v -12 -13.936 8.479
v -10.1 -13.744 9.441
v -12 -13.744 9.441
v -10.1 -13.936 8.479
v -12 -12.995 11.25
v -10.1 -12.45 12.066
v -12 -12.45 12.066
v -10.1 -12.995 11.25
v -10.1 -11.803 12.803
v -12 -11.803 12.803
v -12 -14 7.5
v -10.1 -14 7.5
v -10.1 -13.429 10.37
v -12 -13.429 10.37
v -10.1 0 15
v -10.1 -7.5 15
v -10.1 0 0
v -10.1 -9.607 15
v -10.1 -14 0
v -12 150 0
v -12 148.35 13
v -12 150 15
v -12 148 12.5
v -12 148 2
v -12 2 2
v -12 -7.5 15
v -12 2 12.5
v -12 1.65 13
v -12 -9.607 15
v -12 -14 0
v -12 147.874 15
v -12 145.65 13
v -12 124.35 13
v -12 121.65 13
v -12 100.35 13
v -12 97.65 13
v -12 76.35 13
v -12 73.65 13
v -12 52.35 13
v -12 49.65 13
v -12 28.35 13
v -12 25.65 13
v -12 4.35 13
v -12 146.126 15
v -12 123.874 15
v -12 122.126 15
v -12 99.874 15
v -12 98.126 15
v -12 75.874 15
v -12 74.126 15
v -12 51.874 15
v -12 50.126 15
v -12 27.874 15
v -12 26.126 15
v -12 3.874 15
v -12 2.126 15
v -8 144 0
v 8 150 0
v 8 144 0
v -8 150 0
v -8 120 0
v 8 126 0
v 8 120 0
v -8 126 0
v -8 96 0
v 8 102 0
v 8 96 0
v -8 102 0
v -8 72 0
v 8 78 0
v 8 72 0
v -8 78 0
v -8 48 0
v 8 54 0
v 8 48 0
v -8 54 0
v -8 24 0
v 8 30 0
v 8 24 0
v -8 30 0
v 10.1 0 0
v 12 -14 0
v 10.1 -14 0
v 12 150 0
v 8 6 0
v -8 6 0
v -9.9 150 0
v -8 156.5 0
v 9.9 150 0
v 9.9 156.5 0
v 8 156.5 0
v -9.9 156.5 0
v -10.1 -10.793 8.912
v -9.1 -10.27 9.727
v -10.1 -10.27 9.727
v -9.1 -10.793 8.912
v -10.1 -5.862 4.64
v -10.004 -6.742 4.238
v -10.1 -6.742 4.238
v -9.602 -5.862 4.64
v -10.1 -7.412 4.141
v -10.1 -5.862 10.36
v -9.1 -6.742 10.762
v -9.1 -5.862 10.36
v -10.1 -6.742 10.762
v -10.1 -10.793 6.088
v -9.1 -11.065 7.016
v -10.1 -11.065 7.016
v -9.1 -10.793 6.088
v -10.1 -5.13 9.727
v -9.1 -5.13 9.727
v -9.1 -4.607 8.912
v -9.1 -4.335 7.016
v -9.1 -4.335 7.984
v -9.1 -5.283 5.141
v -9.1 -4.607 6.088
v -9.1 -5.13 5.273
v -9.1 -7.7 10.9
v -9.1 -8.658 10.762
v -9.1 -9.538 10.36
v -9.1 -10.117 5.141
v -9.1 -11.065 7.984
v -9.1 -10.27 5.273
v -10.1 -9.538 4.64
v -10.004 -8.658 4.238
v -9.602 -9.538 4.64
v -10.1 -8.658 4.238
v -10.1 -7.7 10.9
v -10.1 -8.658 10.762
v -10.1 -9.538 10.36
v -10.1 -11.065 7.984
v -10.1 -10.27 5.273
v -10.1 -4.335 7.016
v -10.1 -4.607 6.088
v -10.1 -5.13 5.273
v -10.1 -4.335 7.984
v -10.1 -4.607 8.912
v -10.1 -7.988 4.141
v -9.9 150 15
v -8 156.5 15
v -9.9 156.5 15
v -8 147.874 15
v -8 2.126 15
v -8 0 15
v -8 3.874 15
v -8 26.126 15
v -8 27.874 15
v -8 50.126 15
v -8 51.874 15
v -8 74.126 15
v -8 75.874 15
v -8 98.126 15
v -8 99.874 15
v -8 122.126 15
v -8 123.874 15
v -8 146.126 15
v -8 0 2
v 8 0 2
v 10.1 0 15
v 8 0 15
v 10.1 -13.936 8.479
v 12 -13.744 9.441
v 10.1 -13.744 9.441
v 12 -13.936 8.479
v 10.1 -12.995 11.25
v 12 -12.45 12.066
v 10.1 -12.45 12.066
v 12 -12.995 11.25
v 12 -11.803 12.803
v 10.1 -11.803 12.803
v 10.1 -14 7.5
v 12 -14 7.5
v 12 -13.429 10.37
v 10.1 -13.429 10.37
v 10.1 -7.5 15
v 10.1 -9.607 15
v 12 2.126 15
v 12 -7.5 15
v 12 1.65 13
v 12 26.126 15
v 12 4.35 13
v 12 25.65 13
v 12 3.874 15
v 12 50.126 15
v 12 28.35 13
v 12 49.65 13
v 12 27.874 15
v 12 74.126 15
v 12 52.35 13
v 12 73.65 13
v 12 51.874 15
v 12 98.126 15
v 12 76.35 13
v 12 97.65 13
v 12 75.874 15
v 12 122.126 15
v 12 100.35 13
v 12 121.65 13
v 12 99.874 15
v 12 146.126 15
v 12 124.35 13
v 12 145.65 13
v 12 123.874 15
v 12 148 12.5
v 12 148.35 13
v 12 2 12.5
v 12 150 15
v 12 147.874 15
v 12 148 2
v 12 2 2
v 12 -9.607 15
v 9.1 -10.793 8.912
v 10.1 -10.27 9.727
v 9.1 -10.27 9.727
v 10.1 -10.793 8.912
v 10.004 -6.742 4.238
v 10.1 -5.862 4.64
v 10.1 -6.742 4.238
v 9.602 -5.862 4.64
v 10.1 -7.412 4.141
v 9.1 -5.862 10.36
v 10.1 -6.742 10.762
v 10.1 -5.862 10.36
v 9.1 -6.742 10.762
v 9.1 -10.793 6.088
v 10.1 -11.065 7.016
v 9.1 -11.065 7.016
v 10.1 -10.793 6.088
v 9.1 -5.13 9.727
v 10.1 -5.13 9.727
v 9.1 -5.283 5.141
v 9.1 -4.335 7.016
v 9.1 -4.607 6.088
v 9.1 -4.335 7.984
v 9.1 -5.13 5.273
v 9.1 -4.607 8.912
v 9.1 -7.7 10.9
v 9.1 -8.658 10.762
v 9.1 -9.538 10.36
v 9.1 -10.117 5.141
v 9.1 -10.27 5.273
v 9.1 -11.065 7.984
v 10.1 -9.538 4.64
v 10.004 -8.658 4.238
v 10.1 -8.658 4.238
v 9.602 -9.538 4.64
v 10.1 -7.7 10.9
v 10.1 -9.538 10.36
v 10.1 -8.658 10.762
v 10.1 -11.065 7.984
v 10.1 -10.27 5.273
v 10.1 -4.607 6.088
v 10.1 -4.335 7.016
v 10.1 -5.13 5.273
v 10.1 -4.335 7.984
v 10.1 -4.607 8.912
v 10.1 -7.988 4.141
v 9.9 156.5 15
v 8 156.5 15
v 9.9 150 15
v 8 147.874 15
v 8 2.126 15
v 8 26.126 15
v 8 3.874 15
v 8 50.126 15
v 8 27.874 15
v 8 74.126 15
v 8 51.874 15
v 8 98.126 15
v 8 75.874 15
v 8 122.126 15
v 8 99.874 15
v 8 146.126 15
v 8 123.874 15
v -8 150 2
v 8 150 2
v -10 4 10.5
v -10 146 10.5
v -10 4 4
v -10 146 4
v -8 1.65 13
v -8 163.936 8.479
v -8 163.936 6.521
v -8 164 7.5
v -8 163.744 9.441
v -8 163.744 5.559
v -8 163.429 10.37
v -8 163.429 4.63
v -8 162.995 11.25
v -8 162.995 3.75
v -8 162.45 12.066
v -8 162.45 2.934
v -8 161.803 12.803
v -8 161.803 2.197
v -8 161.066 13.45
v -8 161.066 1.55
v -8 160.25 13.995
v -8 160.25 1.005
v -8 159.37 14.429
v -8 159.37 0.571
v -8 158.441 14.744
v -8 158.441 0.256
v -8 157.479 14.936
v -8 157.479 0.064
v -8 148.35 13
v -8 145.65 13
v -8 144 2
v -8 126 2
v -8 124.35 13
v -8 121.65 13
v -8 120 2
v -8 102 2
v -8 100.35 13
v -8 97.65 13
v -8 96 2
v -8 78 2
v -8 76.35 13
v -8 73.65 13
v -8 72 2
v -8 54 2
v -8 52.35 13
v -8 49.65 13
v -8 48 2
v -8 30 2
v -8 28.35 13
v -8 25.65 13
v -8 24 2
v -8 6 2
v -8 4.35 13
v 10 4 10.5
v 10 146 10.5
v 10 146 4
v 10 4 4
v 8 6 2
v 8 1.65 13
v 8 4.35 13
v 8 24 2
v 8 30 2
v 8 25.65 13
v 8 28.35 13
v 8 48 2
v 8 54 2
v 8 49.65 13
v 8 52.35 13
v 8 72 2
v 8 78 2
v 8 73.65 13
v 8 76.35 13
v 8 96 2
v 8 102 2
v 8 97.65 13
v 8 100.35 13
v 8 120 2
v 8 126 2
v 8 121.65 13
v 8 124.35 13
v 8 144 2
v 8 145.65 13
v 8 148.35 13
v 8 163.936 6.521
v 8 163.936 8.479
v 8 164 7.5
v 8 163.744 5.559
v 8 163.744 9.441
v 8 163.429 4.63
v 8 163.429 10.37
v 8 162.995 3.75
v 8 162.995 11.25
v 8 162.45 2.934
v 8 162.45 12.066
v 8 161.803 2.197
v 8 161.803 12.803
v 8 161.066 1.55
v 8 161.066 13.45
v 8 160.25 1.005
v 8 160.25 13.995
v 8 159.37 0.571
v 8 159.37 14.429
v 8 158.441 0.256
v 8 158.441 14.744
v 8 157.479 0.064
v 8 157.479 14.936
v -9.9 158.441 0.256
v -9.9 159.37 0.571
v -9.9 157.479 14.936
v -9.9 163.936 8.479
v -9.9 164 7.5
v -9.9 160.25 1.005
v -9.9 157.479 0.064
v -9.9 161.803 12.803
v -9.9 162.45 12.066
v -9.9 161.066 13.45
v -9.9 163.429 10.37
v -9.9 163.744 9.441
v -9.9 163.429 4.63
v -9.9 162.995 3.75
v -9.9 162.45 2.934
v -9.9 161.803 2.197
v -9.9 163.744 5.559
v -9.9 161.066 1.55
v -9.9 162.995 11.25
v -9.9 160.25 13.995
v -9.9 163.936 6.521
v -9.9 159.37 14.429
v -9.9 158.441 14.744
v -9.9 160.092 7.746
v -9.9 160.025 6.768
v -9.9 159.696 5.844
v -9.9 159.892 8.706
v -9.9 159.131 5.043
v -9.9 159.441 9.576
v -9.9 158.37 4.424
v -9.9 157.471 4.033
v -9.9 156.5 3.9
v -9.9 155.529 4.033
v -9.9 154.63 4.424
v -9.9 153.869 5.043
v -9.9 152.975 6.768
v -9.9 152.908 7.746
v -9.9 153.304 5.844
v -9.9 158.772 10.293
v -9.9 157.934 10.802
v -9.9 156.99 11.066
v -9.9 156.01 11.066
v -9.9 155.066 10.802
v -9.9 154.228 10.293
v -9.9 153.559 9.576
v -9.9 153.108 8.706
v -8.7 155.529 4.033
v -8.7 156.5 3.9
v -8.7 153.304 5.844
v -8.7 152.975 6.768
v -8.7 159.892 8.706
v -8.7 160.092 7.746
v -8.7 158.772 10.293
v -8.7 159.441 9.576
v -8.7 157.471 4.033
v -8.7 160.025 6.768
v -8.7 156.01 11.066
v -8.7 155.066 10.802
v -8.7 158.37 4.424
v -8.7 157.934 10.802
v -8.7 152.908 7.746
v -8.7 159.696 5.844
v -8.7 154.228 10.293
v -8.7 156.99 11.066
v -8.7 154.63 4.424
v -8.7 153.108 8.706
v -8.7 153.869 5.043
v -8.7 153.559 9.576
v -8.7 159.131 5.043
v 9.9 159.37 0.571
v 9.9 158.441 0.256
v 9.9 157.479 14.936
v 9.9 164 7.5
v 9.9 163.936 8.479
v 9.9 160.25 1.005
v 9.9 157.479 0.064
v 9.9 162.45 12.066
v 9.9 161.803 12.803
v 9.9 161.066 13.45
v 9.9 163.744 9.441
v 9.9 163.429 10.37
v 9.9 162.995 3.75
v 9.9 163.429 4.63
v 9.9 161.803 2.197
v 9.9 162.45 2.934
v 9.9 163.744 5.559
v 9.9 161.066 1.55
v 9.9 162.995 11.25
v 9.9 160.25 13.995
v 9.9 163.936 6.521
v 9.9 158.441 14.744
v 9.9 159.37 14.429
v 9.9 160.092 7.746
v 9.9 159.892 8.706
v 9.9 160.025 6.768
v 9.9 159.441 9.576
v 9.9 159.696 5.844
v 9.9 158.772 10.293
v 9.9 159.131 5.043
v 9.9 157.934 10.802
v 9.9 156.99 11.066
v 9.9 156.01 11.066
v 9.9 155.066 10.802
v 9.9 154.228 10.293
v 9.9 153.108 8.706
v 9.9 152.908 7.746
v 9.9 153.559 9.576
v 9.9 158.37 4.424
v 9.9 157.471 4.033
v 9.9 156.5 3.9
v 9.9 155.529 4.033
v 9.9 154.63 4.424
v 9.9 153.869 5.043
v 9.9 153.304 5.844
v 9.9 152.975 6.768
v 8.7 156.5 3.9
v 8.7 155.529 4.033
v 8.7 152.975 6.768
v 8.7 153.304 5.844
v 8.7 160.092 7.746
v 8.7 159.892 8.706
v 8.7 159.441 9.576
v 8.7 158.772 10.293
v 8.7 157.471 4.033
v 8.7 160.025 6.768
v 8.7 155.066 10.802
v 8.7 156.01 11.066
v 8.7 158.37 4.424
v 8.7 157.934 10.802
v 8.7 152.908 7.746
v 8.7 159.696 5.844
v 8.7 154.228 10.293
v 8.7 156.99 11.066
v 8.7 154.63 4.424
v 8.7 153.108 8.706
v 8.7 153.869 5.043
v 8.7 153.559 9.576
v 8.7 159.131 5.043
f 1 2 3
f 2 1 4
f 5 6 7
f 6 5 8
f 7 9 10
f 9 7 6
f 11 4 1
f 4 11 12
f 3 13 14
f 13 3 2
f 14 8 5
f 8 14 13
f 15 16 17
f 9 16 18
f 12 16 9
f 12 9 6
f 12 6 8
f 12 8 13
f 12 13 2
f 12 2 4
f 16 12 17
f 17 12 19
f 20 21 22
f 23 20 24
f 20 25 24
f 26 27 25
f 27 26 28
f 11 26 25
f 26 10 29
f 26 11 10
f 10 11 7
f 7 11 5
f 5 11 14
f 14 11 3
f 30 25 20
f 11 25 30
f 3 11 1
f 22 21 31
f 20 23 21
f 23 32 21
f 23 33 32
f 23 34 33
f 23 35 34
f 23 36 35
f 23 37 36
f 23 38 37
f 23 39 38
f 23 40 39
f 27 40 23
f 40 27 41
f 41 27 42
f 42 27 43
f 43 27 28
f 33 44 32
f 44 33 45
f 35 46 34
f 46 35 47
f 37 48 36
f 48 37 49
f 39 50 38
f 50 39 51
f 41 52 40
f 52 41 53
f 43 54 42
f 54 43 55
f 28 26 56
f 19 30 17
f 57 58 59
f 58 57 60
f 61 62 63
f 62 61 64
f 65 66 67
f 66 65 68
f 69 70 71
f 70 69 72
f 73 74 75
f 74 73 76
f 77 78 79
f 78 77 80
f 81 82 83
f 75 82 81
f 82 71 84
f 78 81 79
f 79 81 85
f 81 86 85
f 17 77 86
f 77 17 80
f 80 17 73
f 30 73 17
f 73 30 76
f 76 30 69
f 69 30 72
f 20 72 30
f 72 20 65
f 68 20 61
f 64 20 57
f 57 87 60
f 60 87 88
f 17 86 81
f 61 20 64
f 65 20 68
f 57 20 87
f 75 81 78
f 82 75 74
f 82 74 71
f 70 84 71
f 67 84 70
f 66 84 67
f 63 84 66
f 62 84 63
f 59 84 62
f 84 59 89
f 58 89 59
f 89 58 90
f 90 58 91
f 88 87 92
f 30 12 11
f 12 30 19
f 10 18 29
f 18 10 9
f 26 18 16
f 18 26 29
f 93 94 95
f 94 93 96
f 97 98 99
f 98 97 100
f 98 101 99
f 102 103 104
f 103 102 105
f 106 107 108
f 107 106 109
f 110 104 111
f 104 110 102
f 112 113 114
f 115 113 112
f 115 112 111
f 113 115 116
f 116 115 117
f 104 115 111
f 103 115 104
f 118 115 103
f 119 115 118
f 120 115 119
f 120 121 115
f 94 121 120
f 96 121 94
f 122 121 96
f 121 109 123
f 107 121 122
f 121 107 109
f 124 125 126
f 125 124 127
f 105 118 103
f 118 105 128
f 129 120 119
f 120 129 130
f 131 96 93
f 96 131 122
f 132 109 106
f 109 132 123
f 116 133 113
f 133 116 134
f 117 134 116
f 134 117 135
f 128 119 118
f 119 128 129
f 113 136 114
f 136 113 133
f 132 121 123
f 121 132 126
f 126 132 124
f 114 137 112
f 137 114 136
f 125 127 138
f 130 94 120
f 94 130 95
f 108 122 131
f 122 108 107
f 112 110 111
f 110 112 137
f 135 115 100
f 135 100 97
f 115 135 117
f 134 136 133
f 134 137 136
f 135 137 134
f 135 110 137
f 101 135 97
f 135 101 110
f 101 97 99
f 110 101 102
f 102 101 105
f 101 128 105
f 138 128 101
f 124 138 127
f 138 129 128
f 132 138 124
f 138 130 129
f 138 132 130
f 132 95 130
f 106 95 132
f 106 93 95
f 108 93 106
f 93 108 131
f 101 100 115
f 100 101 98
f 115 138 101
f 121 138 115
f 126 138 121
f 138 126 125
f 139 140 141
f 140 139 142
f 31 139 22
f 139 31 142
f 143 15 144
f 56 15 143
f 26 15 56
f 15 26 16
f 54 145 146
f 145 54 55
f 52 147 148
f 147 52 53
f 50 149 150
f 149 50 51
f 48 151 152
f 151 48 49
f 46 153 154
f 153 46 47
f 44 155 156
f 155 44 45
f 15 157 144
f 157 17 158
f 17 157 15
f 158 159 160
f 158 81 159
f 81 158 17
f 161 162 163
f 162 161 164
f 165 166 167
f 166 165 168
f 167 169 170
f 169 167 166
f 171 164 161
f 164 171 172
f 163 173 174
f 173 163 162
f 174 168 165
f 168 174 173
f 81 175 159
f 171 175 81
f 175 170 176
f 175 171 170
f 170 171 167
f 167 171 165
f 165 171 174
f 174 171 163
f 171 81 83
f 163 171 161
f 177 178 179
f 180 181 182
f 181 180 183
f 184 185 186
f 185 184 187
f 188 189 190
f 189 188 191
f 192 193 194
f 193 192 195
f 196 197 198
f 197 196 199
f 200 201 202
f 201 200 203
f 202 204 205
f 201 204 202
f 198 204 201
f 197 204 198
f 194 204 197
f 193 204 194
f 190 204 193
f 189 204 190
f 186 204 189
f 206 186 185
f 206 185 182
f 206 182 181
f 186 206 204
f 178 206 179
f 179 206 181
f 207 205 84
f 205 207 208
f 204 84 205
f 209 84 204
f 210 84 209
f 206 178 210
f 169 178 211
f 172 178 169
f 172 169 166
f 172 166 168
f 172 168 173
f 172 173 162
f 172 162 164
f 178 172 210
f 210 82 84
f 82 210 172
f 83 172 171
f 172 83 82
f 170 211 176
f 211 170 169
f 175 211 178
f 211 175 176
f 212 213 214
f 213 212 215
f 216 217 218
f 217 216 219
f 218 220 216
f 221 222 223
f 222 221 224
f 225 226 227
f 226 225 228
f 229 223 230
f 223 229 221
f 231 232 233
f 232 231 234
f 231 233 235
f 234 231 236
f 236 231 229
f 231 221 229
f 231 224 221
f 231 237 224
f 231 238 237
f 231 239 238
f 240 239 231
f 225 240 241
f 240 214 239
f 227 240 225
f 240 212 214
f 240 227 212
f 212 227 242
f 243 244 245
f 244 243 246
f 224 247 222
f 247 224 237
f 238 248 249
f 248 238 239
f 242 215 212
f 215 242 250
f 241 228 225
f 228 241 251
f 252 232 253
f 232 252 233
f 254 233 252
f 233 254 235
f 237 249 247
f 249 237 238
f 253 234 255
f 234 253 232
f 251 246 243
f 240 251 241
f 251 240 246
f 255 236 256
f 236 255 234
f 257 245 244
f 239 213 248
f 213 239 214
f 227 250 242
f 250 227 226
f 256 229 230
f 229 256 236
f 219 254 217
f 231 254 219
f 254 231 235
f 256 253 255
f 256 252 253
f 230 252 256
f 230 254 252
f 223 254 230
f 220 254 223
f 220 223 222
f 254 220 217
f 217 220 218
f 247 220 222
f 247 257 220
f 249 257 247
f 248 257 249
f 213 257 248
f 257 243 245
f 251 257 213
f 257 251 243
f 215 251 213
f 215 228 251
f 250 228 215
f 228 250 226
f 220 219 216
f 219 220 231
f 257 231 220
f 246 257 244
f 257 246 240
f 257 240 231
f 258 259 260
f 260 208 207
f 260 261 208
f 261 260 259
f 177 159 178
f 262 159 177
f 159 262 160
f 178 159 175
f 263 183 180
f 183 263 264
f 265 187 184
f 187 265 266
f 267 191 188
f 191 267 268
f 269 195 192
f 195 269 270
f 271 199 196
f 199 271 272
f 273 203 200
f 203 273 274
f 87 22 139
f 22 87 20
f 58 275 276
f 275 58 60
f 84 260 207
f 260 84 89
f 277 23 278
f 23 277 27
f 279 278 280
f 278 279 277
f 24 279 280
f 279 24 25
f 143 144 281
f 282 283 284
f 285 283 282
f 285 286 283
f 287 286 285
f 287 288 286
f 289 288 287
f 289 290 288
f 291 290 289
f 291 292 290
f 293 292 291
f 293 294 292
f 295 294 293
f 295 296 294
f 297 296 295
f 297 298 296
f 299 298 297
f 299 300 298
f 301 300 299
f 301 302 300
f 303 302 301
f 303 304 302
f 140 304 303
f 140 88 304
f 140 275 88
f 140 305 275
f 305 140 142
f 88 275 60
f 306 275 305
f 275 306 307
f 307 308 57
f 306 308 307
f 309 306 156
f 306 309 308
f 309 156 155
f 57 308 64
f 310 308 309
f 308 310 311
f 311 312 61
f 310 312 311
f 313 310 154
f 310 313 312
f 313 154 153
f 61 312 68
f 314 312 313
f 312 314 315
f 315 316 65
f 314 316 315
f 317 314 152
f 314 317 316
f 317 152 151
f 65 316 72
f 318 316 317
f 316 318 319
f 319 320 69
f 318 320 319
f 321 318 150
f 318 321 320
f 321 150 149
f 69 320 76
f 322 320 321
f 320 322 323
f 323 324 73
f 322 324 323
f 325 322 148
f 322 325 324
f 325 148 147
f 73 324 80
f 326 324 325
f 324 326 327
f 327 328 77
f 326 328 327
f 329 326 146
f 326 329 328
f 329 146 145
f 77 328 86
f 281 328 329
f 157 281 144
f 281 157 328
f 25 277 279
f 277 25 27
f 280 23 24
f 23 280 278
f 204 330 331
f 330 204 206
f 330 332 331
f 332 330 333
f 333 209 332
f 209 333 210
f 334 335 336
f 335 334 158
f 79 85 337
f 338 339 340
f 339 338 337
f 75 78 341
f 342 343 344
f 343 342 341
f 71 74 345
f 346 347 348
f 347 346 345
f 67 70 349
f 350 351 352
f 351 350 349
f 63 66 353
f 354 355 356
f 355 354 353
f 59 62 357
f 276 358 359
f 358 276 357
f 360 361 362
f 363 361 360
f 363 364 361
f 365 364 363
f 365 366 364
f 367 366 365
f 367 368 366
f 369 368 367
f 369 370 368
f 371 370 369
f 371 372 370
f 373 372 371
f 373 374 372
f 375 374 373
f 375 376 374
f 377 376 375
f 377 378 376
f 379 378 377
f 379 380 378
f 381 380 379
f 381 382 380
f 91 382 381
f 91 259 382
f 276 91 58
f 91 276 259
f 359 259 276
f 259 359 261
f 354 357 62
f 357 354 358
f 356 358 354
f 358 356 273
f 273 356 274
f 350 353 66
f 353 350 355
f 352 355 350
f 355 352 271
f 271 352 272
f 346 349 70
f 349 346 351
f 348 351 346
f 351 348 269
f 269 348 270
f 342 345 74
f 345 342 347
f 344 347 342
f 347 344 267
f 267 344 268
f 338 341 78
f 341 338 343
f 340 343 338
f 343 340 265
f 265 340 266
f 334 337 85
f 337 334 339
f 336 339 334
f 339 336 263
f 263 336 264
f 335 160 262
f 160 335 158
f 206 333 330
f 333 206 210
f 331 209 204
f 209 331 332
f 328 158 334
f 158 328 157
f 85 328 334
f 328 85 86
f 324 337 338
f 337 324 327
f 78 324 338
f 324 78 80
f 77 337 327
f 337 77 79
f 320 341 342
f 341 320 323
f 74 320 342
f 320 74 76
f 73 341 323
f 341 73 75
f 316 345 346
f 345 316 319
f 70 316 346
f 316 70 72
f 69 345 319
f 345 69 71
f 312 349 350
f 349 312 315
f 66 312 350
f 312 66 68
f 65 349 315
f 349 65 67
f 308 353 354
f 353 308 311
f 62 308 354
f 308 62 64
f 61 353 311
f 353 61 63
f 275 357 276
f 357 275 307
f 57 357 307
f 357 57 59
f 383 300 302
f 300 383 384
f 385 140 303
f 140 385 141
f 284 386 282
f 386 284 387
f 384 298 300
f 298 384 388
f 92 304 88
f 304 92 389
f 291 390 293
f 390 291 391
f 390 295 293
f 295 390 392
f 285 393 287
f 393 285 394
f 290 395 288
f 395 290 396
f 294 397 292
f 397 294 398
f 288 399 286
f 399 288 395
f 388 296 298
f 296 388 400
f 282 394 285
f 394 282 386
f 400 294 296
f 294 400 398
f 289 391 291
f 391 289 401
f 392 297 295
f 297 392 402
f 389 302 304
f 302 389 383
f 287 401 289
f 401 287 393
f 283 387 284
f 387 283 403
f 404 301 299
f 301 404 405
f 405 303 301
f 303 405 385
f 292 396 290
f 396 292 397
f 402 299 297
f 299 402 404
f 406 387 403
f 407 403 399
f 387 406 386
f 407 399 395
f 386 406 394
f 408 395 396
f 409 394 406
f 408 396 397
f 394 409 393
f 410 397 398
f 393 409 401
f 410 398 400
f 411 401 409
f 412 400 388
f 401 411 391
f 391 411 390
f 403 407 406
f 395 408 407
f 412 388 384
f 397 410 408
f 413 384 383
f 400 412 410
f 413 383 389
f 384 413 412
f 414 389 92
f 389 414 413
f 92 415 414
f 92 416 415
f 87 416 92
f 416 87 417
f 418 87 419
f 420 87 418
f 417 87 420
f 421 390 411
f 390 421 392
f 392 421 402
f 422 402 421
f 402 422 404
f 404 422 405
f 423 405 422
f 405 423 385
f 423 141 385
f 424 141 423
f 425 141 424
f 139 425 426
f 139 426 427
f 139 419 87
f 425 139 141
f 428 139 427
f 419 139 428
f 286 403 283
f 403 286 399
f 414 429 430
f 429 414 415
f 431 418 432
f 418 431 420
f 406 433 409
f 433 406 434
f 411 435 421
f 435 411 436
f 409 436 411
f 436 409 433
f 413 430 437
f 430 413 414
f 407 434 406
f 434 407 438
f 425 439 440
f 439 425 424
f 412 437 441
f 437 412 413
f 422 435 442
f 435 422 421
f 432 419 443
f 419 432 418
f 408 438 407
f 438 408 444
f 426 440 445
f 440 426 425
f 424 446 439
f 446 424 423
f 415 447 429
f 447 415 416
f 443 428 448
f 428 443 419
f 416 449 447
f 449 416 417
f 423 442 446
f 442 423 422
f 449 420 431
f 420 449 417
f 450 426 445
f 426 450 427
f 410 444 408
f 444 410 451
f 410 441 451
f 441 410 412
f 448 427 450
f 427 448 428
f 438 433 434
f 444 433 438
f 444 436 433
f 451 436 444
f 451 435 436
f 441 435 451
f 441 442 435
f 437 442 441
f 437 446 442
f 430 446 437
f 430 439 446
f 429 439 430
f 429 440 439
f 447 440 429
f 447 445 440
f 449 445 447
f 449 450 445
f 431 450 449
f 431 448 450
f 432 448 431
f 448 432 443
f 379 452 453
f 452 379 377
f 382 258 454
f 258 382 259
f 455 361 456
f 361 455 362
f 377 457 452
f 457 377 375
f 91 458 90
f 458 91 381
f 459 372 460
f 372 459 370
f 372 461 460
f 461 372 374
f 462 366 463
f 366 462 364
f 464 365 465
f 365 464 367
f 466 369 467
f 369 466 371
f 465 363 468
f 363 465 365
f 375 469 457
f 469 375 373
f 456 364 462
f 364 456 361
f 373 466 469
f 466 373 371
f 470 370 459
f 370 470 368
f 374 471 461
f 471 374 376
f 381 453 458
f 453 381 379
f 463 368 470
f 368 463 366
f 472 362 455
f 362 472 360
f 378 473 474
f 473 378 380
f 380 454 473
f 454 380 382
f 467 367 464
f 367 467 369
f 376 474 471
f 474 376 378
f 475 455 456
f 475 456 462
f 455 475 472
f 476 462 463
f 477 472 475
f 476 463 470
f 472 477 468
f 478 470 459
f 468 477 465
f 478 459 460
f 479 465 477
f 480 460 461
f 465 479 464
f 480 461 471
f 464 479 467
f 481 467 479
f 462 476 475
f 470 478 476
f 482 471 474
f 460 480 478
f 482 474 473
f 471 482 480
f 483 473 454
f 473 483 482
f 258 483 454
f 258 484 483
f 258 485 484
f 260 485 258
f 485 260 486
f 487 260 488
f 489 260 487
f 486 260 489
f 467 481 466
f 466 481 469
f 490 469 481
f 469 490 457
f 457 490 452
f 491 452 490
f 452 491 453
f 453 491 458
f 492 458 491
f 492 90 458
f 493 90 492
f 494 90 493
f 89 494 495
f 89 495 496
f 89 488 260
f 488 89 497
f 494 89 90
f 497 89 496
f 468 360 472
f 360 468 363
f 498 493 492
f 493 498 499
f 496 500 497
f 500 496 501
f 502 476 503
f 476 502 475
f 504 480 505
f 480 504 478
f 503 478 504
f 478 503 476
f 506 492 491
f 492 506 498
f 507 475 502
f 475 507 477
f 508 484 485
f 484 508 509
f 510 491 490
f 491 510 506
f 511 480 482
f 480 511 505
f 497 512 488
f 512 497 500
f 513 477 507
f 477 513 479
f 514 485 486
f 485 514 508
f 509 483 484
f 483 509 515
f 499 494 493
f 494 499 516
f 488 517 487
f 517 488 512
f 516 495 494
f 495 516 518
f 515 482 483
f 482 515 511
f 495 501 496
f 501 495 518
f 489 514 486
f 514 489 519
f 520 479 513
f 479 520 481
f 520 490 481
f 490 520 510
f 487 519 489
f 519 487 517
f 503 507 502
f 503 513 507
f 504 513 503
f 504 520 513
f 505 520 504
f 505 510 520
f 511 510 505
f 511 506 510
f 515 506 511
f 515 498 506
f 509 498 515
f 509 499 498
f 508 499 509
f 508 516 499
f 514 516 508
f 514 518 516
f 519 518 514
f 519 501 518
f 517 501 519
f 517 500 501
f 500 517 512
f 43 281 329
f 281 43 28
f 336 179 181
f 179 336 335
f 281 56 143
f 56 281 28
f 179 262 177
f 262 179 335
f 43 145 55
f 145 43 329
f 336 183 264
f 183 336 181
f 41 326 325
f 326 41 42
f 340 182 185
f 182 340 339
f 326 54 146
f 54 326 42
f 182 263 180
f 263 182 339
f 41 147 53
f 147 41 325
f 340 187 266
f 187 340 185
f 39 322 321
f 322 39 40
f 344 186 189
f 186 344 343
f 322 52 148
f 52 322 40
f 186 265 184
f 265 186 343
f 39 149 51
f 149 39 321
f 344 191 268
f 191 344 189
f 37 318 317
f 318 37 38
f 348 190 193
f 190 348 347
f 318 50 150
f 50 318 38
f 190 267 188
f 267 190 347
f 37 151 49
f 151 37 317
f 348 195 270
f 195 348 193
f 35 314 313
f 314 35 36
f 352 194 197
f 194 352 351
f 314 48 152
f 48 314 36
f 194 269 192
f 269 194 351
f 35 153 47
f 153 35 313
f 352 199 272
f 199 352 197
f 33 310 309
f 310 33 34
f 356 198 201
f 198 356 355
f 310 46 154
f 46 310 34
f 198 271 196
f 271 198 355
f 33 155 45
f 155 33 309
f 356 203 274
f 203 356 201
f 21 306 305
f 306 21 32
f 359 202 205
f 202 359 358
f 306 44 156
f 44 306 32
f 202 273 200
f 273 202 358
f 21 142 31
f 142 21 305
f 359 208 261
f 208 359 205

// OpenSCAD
// file: link.scad
include<parameters.scad>;

module notch_profile(with_tolerance=false) {
    polygon([
        [clip_thickness,
         -1.25 - (with_tolerance ? tolerance/2 : 0)],
        [(with_tolerance ? -.1 : 0),
         -.75 - (with_tolerance ? tolerance/2 : 0)],
        [(with_tolerance ? -.1 : 0),
         .75 + (with_tolerance ? tolerance/2 : 0)],
        [clip_thickness,
         1.25 + (with_tolerance ? tolerance/2 : 0)]
    ]);
}

module link_back() {
    union()
    translate([0, 0, outer_height/2])
    for(n=[0, 1])
    mirror([n, 0, 0])
    translate([-outer_width/2, 0, 0])
    union() {
        translate([0, _trim, 0])
        union() {
            difference() {
                translate([0, -outer_height/2, 0])
                rotate([0, 90, 0])
                cylinder(d=outer_height, h=wall_thickness-tolerance/2);

                translate([-.1, -outer_height/2, -outer_height/2])
                cube([wall_thickness+.2, outer_height/2, outer_height]);
            }

            translate([0, -outer_height, -outer_height/2])
            cube([wall_thickness-tolerance/2, outer_height/2, outer_height/2]);

            radius = (outer_height/2);
            translate([0, -(radius*(1+cos(45))), radius*sin(45)])
            rotate([90, 0, 90])
            linear_extrude(height=wall_thickness-tolerance/2)
            polygon([
                [0, 0],
                [radius*(1-sin(45)), radius*(1-sin(45))],
                [radius*cos(45), radius*(1-sin(45))],
                [radius*cos(45), 0]
            ]);
        }

        translate([0, -outer_height/2, -outer_height/2])
        cube([wall_thickness-tolerance/2, outer_height/2, outer_height]);

        // key
        translate([0, -outer_height/2-tolerance, 0])
        rotate([0, 90, 0])
        translate([0, 0, wall_thickness-.1])
        difference() {
            cylinder(d=key_diameter-tolerance, h=key_depth+.1-tolerance);

            translate([key_diameter/2, -key_diameter/2-1, 0])
            rotate([0, 270-key_slope_bottom, 0])
            translate([0, 0,-.9])
            cube([10,10,1]);
        }
    }
}

module link_mid() {
    translate([0, -mid_depth, 0])
    difference() {
        union() {
            // walls
            translate([0, 0, outer_height/2])
            for(n=[0, 1])
            mirror([n, 0, 0])
            translate([-outer_width/2, 0, -outer_height/2])
            cube([wall_thickness * 2, mid_depth, outer_height]);

            // base
            translate([-outer_width/2, 0, 0])
            cube([outer_width, mid_depth, wall_thickness]);
        }

        // notch cutout
        translate([-outer_width/2-.5, mid_depth/2, outer_height])
        rotate([0, 90, 0])
        linear_extrude(height=outer_width+1)
        notch_profile(true);
    }
}

module link_front() {
    union()
    translate([0, 0, outer_height/2])
    for(n=[0, 1])
    mirror([n, 0, 0])
    translate([-outer_width/2 + wall_thickness, 0, 0])
    difference() {
        union() {
            translate([0, -_trim, 0])
            difference() {
                translate([tolerance/2, outer_height/2, 0])
                rotate([0, 90, 0])
                cylinder(d=outer_height, h=wall_thickness-tolerance/2);

                translate([tolerance-.1, 0, -outer_height/2])
                cube([wall_thickness-tolerance+.2, outer_height/2, outer_height]);
            }

            translate([tolerance/2, 0, -outer_height/2])
            cube([wall_thickness-tolerance/2, outer_height/2-_trim, outer_height]);
        }

        // keyhole
        translate([0, outer_height/2-_trim, 0])
        rotate([0, 90, 0])
        translate([0, 0, -.1])
        cylinder(d=key_diameter+tolerance, h=key_depth+.1+tolerance);
    }
}

module clip() {
    union() {
        for(r=[0, 180])
        rotate([0, 0, r]) {
            translate([outer_width/2-wall_thickness*2.5, 0, clip_thickness])
            rotate([0, 90, 0])
            linear_extrude(height=wall_thickness+.25)
            notch_profile(false);

            translate([outer_width/2-wall_thickness*2-clip_curve_thickness, -1.5, 0])
            cube([clip_curve_thickness, 3, clip_thickness]);

            translate([-clip_curve_thickness/2, -clip_curve_thickness, 0])
            cube([clip_curve_thickness, clip_curve_thickness*2, clip_thickness]);

            cyl_radius=(outer_width-wall_thickness*4+clip_curve_thickness)/4;

            translate([cyl_radius-clip_curve_thickness/2, 1, 0])
            difference() {
                cylinder(r=cyl_radius, h=clip_thickness);

                translate([0, 0, -.1])
                cylinder(r=cyl_radius-clip_curve_thickness, h=clip_thickness+.2);

                translate([-outer_width/2, -outer_width/2, -.1])
                cube([outer_width, outer_width/2, clip_thickness + .2]);
            }
        }
    }
}

module full_link() {
    union() {
        translate([0, -mid_depth, 0])
        link_back();
        link_mid();
        link_front();
    }
}

//translate([0, -mid_depth/2, outer_height-clip_thickness])
//translate([outer_width, 0, 0])
clip();

//full_link();
// file: parameters.scad
tolerance = .2;

outer_width = 24;
outer_height = 15;

mid_depth = 6;

wall_thickness = 2;

key_diameter = 7;
key_depth = 1.1;
key_slope_bottom = 45;

clip_thickness = 2;
clip_curve_thickness = 1.75;

end_screw_hole_diameter = 3.5;

_trim = 1;

$fa = 3;
$fs = 1;
// main file
include<parameters.scad>;
use<link.scad>;

length = 150;
spacing = 25;

difference() {
    union() {
        link_back();

        // wall profile
        for(n=[0, 1])
        mirror([n, 0, 0])
        translate([-outer_width/2, 0, 0])
        union() {
            //wall span
            translate([0, length, 0])
            rotate([90, 0, 0])
            linear_extrude(height=length)
            polygon([
                [0, 0],
                [0, wall_thickness],
                [wall_thickness, wall_thickness*2],
                [wall_thickness, outer_height - wall_thickness*2.25],
                [0, outer_height - wall_thickness*1.25],
                [0, outer_height],
                [wall_thickness * 2, outer_height],
                [wall_thickness * 2, 0]
            ]);

            // leading bevel
            linear_extrude(height=outer_height)
            polygon([
                [0, 0],
                [0, wall_thickness],
                [wall_thickness*2, wall_thickness*3],
                [wall_thickness*2, 0]
            ]);

            // trailing bevel
            translate([0, length, 0])
            linear_extrude(height=outer_height)
            polygon([
                [0, 0],
                [wall_thickness*2, 0],
                [wall_thickness*2, -wall_thickness*3],
                [0, -wall_thickness]
            ]);
        }

        for(n=[0:spacing:length])
        translate([-outer_width/2, n - mid_depth*n/length, 0])
        cube([outer_width, mid_depth, wall_thickness]);

        translate([0, length, 0])
        link_front();
    }

    // notch cutouts
    for(n=[0:spacing:length])
    translate([-outer_width/2-.5, mid_depth/2 + n - mid_depth*n/length, outer_height])
    rotate([0, 90, 0])
    linear_extrude(height=outer_width+1)
    notch_profile(true);
}
